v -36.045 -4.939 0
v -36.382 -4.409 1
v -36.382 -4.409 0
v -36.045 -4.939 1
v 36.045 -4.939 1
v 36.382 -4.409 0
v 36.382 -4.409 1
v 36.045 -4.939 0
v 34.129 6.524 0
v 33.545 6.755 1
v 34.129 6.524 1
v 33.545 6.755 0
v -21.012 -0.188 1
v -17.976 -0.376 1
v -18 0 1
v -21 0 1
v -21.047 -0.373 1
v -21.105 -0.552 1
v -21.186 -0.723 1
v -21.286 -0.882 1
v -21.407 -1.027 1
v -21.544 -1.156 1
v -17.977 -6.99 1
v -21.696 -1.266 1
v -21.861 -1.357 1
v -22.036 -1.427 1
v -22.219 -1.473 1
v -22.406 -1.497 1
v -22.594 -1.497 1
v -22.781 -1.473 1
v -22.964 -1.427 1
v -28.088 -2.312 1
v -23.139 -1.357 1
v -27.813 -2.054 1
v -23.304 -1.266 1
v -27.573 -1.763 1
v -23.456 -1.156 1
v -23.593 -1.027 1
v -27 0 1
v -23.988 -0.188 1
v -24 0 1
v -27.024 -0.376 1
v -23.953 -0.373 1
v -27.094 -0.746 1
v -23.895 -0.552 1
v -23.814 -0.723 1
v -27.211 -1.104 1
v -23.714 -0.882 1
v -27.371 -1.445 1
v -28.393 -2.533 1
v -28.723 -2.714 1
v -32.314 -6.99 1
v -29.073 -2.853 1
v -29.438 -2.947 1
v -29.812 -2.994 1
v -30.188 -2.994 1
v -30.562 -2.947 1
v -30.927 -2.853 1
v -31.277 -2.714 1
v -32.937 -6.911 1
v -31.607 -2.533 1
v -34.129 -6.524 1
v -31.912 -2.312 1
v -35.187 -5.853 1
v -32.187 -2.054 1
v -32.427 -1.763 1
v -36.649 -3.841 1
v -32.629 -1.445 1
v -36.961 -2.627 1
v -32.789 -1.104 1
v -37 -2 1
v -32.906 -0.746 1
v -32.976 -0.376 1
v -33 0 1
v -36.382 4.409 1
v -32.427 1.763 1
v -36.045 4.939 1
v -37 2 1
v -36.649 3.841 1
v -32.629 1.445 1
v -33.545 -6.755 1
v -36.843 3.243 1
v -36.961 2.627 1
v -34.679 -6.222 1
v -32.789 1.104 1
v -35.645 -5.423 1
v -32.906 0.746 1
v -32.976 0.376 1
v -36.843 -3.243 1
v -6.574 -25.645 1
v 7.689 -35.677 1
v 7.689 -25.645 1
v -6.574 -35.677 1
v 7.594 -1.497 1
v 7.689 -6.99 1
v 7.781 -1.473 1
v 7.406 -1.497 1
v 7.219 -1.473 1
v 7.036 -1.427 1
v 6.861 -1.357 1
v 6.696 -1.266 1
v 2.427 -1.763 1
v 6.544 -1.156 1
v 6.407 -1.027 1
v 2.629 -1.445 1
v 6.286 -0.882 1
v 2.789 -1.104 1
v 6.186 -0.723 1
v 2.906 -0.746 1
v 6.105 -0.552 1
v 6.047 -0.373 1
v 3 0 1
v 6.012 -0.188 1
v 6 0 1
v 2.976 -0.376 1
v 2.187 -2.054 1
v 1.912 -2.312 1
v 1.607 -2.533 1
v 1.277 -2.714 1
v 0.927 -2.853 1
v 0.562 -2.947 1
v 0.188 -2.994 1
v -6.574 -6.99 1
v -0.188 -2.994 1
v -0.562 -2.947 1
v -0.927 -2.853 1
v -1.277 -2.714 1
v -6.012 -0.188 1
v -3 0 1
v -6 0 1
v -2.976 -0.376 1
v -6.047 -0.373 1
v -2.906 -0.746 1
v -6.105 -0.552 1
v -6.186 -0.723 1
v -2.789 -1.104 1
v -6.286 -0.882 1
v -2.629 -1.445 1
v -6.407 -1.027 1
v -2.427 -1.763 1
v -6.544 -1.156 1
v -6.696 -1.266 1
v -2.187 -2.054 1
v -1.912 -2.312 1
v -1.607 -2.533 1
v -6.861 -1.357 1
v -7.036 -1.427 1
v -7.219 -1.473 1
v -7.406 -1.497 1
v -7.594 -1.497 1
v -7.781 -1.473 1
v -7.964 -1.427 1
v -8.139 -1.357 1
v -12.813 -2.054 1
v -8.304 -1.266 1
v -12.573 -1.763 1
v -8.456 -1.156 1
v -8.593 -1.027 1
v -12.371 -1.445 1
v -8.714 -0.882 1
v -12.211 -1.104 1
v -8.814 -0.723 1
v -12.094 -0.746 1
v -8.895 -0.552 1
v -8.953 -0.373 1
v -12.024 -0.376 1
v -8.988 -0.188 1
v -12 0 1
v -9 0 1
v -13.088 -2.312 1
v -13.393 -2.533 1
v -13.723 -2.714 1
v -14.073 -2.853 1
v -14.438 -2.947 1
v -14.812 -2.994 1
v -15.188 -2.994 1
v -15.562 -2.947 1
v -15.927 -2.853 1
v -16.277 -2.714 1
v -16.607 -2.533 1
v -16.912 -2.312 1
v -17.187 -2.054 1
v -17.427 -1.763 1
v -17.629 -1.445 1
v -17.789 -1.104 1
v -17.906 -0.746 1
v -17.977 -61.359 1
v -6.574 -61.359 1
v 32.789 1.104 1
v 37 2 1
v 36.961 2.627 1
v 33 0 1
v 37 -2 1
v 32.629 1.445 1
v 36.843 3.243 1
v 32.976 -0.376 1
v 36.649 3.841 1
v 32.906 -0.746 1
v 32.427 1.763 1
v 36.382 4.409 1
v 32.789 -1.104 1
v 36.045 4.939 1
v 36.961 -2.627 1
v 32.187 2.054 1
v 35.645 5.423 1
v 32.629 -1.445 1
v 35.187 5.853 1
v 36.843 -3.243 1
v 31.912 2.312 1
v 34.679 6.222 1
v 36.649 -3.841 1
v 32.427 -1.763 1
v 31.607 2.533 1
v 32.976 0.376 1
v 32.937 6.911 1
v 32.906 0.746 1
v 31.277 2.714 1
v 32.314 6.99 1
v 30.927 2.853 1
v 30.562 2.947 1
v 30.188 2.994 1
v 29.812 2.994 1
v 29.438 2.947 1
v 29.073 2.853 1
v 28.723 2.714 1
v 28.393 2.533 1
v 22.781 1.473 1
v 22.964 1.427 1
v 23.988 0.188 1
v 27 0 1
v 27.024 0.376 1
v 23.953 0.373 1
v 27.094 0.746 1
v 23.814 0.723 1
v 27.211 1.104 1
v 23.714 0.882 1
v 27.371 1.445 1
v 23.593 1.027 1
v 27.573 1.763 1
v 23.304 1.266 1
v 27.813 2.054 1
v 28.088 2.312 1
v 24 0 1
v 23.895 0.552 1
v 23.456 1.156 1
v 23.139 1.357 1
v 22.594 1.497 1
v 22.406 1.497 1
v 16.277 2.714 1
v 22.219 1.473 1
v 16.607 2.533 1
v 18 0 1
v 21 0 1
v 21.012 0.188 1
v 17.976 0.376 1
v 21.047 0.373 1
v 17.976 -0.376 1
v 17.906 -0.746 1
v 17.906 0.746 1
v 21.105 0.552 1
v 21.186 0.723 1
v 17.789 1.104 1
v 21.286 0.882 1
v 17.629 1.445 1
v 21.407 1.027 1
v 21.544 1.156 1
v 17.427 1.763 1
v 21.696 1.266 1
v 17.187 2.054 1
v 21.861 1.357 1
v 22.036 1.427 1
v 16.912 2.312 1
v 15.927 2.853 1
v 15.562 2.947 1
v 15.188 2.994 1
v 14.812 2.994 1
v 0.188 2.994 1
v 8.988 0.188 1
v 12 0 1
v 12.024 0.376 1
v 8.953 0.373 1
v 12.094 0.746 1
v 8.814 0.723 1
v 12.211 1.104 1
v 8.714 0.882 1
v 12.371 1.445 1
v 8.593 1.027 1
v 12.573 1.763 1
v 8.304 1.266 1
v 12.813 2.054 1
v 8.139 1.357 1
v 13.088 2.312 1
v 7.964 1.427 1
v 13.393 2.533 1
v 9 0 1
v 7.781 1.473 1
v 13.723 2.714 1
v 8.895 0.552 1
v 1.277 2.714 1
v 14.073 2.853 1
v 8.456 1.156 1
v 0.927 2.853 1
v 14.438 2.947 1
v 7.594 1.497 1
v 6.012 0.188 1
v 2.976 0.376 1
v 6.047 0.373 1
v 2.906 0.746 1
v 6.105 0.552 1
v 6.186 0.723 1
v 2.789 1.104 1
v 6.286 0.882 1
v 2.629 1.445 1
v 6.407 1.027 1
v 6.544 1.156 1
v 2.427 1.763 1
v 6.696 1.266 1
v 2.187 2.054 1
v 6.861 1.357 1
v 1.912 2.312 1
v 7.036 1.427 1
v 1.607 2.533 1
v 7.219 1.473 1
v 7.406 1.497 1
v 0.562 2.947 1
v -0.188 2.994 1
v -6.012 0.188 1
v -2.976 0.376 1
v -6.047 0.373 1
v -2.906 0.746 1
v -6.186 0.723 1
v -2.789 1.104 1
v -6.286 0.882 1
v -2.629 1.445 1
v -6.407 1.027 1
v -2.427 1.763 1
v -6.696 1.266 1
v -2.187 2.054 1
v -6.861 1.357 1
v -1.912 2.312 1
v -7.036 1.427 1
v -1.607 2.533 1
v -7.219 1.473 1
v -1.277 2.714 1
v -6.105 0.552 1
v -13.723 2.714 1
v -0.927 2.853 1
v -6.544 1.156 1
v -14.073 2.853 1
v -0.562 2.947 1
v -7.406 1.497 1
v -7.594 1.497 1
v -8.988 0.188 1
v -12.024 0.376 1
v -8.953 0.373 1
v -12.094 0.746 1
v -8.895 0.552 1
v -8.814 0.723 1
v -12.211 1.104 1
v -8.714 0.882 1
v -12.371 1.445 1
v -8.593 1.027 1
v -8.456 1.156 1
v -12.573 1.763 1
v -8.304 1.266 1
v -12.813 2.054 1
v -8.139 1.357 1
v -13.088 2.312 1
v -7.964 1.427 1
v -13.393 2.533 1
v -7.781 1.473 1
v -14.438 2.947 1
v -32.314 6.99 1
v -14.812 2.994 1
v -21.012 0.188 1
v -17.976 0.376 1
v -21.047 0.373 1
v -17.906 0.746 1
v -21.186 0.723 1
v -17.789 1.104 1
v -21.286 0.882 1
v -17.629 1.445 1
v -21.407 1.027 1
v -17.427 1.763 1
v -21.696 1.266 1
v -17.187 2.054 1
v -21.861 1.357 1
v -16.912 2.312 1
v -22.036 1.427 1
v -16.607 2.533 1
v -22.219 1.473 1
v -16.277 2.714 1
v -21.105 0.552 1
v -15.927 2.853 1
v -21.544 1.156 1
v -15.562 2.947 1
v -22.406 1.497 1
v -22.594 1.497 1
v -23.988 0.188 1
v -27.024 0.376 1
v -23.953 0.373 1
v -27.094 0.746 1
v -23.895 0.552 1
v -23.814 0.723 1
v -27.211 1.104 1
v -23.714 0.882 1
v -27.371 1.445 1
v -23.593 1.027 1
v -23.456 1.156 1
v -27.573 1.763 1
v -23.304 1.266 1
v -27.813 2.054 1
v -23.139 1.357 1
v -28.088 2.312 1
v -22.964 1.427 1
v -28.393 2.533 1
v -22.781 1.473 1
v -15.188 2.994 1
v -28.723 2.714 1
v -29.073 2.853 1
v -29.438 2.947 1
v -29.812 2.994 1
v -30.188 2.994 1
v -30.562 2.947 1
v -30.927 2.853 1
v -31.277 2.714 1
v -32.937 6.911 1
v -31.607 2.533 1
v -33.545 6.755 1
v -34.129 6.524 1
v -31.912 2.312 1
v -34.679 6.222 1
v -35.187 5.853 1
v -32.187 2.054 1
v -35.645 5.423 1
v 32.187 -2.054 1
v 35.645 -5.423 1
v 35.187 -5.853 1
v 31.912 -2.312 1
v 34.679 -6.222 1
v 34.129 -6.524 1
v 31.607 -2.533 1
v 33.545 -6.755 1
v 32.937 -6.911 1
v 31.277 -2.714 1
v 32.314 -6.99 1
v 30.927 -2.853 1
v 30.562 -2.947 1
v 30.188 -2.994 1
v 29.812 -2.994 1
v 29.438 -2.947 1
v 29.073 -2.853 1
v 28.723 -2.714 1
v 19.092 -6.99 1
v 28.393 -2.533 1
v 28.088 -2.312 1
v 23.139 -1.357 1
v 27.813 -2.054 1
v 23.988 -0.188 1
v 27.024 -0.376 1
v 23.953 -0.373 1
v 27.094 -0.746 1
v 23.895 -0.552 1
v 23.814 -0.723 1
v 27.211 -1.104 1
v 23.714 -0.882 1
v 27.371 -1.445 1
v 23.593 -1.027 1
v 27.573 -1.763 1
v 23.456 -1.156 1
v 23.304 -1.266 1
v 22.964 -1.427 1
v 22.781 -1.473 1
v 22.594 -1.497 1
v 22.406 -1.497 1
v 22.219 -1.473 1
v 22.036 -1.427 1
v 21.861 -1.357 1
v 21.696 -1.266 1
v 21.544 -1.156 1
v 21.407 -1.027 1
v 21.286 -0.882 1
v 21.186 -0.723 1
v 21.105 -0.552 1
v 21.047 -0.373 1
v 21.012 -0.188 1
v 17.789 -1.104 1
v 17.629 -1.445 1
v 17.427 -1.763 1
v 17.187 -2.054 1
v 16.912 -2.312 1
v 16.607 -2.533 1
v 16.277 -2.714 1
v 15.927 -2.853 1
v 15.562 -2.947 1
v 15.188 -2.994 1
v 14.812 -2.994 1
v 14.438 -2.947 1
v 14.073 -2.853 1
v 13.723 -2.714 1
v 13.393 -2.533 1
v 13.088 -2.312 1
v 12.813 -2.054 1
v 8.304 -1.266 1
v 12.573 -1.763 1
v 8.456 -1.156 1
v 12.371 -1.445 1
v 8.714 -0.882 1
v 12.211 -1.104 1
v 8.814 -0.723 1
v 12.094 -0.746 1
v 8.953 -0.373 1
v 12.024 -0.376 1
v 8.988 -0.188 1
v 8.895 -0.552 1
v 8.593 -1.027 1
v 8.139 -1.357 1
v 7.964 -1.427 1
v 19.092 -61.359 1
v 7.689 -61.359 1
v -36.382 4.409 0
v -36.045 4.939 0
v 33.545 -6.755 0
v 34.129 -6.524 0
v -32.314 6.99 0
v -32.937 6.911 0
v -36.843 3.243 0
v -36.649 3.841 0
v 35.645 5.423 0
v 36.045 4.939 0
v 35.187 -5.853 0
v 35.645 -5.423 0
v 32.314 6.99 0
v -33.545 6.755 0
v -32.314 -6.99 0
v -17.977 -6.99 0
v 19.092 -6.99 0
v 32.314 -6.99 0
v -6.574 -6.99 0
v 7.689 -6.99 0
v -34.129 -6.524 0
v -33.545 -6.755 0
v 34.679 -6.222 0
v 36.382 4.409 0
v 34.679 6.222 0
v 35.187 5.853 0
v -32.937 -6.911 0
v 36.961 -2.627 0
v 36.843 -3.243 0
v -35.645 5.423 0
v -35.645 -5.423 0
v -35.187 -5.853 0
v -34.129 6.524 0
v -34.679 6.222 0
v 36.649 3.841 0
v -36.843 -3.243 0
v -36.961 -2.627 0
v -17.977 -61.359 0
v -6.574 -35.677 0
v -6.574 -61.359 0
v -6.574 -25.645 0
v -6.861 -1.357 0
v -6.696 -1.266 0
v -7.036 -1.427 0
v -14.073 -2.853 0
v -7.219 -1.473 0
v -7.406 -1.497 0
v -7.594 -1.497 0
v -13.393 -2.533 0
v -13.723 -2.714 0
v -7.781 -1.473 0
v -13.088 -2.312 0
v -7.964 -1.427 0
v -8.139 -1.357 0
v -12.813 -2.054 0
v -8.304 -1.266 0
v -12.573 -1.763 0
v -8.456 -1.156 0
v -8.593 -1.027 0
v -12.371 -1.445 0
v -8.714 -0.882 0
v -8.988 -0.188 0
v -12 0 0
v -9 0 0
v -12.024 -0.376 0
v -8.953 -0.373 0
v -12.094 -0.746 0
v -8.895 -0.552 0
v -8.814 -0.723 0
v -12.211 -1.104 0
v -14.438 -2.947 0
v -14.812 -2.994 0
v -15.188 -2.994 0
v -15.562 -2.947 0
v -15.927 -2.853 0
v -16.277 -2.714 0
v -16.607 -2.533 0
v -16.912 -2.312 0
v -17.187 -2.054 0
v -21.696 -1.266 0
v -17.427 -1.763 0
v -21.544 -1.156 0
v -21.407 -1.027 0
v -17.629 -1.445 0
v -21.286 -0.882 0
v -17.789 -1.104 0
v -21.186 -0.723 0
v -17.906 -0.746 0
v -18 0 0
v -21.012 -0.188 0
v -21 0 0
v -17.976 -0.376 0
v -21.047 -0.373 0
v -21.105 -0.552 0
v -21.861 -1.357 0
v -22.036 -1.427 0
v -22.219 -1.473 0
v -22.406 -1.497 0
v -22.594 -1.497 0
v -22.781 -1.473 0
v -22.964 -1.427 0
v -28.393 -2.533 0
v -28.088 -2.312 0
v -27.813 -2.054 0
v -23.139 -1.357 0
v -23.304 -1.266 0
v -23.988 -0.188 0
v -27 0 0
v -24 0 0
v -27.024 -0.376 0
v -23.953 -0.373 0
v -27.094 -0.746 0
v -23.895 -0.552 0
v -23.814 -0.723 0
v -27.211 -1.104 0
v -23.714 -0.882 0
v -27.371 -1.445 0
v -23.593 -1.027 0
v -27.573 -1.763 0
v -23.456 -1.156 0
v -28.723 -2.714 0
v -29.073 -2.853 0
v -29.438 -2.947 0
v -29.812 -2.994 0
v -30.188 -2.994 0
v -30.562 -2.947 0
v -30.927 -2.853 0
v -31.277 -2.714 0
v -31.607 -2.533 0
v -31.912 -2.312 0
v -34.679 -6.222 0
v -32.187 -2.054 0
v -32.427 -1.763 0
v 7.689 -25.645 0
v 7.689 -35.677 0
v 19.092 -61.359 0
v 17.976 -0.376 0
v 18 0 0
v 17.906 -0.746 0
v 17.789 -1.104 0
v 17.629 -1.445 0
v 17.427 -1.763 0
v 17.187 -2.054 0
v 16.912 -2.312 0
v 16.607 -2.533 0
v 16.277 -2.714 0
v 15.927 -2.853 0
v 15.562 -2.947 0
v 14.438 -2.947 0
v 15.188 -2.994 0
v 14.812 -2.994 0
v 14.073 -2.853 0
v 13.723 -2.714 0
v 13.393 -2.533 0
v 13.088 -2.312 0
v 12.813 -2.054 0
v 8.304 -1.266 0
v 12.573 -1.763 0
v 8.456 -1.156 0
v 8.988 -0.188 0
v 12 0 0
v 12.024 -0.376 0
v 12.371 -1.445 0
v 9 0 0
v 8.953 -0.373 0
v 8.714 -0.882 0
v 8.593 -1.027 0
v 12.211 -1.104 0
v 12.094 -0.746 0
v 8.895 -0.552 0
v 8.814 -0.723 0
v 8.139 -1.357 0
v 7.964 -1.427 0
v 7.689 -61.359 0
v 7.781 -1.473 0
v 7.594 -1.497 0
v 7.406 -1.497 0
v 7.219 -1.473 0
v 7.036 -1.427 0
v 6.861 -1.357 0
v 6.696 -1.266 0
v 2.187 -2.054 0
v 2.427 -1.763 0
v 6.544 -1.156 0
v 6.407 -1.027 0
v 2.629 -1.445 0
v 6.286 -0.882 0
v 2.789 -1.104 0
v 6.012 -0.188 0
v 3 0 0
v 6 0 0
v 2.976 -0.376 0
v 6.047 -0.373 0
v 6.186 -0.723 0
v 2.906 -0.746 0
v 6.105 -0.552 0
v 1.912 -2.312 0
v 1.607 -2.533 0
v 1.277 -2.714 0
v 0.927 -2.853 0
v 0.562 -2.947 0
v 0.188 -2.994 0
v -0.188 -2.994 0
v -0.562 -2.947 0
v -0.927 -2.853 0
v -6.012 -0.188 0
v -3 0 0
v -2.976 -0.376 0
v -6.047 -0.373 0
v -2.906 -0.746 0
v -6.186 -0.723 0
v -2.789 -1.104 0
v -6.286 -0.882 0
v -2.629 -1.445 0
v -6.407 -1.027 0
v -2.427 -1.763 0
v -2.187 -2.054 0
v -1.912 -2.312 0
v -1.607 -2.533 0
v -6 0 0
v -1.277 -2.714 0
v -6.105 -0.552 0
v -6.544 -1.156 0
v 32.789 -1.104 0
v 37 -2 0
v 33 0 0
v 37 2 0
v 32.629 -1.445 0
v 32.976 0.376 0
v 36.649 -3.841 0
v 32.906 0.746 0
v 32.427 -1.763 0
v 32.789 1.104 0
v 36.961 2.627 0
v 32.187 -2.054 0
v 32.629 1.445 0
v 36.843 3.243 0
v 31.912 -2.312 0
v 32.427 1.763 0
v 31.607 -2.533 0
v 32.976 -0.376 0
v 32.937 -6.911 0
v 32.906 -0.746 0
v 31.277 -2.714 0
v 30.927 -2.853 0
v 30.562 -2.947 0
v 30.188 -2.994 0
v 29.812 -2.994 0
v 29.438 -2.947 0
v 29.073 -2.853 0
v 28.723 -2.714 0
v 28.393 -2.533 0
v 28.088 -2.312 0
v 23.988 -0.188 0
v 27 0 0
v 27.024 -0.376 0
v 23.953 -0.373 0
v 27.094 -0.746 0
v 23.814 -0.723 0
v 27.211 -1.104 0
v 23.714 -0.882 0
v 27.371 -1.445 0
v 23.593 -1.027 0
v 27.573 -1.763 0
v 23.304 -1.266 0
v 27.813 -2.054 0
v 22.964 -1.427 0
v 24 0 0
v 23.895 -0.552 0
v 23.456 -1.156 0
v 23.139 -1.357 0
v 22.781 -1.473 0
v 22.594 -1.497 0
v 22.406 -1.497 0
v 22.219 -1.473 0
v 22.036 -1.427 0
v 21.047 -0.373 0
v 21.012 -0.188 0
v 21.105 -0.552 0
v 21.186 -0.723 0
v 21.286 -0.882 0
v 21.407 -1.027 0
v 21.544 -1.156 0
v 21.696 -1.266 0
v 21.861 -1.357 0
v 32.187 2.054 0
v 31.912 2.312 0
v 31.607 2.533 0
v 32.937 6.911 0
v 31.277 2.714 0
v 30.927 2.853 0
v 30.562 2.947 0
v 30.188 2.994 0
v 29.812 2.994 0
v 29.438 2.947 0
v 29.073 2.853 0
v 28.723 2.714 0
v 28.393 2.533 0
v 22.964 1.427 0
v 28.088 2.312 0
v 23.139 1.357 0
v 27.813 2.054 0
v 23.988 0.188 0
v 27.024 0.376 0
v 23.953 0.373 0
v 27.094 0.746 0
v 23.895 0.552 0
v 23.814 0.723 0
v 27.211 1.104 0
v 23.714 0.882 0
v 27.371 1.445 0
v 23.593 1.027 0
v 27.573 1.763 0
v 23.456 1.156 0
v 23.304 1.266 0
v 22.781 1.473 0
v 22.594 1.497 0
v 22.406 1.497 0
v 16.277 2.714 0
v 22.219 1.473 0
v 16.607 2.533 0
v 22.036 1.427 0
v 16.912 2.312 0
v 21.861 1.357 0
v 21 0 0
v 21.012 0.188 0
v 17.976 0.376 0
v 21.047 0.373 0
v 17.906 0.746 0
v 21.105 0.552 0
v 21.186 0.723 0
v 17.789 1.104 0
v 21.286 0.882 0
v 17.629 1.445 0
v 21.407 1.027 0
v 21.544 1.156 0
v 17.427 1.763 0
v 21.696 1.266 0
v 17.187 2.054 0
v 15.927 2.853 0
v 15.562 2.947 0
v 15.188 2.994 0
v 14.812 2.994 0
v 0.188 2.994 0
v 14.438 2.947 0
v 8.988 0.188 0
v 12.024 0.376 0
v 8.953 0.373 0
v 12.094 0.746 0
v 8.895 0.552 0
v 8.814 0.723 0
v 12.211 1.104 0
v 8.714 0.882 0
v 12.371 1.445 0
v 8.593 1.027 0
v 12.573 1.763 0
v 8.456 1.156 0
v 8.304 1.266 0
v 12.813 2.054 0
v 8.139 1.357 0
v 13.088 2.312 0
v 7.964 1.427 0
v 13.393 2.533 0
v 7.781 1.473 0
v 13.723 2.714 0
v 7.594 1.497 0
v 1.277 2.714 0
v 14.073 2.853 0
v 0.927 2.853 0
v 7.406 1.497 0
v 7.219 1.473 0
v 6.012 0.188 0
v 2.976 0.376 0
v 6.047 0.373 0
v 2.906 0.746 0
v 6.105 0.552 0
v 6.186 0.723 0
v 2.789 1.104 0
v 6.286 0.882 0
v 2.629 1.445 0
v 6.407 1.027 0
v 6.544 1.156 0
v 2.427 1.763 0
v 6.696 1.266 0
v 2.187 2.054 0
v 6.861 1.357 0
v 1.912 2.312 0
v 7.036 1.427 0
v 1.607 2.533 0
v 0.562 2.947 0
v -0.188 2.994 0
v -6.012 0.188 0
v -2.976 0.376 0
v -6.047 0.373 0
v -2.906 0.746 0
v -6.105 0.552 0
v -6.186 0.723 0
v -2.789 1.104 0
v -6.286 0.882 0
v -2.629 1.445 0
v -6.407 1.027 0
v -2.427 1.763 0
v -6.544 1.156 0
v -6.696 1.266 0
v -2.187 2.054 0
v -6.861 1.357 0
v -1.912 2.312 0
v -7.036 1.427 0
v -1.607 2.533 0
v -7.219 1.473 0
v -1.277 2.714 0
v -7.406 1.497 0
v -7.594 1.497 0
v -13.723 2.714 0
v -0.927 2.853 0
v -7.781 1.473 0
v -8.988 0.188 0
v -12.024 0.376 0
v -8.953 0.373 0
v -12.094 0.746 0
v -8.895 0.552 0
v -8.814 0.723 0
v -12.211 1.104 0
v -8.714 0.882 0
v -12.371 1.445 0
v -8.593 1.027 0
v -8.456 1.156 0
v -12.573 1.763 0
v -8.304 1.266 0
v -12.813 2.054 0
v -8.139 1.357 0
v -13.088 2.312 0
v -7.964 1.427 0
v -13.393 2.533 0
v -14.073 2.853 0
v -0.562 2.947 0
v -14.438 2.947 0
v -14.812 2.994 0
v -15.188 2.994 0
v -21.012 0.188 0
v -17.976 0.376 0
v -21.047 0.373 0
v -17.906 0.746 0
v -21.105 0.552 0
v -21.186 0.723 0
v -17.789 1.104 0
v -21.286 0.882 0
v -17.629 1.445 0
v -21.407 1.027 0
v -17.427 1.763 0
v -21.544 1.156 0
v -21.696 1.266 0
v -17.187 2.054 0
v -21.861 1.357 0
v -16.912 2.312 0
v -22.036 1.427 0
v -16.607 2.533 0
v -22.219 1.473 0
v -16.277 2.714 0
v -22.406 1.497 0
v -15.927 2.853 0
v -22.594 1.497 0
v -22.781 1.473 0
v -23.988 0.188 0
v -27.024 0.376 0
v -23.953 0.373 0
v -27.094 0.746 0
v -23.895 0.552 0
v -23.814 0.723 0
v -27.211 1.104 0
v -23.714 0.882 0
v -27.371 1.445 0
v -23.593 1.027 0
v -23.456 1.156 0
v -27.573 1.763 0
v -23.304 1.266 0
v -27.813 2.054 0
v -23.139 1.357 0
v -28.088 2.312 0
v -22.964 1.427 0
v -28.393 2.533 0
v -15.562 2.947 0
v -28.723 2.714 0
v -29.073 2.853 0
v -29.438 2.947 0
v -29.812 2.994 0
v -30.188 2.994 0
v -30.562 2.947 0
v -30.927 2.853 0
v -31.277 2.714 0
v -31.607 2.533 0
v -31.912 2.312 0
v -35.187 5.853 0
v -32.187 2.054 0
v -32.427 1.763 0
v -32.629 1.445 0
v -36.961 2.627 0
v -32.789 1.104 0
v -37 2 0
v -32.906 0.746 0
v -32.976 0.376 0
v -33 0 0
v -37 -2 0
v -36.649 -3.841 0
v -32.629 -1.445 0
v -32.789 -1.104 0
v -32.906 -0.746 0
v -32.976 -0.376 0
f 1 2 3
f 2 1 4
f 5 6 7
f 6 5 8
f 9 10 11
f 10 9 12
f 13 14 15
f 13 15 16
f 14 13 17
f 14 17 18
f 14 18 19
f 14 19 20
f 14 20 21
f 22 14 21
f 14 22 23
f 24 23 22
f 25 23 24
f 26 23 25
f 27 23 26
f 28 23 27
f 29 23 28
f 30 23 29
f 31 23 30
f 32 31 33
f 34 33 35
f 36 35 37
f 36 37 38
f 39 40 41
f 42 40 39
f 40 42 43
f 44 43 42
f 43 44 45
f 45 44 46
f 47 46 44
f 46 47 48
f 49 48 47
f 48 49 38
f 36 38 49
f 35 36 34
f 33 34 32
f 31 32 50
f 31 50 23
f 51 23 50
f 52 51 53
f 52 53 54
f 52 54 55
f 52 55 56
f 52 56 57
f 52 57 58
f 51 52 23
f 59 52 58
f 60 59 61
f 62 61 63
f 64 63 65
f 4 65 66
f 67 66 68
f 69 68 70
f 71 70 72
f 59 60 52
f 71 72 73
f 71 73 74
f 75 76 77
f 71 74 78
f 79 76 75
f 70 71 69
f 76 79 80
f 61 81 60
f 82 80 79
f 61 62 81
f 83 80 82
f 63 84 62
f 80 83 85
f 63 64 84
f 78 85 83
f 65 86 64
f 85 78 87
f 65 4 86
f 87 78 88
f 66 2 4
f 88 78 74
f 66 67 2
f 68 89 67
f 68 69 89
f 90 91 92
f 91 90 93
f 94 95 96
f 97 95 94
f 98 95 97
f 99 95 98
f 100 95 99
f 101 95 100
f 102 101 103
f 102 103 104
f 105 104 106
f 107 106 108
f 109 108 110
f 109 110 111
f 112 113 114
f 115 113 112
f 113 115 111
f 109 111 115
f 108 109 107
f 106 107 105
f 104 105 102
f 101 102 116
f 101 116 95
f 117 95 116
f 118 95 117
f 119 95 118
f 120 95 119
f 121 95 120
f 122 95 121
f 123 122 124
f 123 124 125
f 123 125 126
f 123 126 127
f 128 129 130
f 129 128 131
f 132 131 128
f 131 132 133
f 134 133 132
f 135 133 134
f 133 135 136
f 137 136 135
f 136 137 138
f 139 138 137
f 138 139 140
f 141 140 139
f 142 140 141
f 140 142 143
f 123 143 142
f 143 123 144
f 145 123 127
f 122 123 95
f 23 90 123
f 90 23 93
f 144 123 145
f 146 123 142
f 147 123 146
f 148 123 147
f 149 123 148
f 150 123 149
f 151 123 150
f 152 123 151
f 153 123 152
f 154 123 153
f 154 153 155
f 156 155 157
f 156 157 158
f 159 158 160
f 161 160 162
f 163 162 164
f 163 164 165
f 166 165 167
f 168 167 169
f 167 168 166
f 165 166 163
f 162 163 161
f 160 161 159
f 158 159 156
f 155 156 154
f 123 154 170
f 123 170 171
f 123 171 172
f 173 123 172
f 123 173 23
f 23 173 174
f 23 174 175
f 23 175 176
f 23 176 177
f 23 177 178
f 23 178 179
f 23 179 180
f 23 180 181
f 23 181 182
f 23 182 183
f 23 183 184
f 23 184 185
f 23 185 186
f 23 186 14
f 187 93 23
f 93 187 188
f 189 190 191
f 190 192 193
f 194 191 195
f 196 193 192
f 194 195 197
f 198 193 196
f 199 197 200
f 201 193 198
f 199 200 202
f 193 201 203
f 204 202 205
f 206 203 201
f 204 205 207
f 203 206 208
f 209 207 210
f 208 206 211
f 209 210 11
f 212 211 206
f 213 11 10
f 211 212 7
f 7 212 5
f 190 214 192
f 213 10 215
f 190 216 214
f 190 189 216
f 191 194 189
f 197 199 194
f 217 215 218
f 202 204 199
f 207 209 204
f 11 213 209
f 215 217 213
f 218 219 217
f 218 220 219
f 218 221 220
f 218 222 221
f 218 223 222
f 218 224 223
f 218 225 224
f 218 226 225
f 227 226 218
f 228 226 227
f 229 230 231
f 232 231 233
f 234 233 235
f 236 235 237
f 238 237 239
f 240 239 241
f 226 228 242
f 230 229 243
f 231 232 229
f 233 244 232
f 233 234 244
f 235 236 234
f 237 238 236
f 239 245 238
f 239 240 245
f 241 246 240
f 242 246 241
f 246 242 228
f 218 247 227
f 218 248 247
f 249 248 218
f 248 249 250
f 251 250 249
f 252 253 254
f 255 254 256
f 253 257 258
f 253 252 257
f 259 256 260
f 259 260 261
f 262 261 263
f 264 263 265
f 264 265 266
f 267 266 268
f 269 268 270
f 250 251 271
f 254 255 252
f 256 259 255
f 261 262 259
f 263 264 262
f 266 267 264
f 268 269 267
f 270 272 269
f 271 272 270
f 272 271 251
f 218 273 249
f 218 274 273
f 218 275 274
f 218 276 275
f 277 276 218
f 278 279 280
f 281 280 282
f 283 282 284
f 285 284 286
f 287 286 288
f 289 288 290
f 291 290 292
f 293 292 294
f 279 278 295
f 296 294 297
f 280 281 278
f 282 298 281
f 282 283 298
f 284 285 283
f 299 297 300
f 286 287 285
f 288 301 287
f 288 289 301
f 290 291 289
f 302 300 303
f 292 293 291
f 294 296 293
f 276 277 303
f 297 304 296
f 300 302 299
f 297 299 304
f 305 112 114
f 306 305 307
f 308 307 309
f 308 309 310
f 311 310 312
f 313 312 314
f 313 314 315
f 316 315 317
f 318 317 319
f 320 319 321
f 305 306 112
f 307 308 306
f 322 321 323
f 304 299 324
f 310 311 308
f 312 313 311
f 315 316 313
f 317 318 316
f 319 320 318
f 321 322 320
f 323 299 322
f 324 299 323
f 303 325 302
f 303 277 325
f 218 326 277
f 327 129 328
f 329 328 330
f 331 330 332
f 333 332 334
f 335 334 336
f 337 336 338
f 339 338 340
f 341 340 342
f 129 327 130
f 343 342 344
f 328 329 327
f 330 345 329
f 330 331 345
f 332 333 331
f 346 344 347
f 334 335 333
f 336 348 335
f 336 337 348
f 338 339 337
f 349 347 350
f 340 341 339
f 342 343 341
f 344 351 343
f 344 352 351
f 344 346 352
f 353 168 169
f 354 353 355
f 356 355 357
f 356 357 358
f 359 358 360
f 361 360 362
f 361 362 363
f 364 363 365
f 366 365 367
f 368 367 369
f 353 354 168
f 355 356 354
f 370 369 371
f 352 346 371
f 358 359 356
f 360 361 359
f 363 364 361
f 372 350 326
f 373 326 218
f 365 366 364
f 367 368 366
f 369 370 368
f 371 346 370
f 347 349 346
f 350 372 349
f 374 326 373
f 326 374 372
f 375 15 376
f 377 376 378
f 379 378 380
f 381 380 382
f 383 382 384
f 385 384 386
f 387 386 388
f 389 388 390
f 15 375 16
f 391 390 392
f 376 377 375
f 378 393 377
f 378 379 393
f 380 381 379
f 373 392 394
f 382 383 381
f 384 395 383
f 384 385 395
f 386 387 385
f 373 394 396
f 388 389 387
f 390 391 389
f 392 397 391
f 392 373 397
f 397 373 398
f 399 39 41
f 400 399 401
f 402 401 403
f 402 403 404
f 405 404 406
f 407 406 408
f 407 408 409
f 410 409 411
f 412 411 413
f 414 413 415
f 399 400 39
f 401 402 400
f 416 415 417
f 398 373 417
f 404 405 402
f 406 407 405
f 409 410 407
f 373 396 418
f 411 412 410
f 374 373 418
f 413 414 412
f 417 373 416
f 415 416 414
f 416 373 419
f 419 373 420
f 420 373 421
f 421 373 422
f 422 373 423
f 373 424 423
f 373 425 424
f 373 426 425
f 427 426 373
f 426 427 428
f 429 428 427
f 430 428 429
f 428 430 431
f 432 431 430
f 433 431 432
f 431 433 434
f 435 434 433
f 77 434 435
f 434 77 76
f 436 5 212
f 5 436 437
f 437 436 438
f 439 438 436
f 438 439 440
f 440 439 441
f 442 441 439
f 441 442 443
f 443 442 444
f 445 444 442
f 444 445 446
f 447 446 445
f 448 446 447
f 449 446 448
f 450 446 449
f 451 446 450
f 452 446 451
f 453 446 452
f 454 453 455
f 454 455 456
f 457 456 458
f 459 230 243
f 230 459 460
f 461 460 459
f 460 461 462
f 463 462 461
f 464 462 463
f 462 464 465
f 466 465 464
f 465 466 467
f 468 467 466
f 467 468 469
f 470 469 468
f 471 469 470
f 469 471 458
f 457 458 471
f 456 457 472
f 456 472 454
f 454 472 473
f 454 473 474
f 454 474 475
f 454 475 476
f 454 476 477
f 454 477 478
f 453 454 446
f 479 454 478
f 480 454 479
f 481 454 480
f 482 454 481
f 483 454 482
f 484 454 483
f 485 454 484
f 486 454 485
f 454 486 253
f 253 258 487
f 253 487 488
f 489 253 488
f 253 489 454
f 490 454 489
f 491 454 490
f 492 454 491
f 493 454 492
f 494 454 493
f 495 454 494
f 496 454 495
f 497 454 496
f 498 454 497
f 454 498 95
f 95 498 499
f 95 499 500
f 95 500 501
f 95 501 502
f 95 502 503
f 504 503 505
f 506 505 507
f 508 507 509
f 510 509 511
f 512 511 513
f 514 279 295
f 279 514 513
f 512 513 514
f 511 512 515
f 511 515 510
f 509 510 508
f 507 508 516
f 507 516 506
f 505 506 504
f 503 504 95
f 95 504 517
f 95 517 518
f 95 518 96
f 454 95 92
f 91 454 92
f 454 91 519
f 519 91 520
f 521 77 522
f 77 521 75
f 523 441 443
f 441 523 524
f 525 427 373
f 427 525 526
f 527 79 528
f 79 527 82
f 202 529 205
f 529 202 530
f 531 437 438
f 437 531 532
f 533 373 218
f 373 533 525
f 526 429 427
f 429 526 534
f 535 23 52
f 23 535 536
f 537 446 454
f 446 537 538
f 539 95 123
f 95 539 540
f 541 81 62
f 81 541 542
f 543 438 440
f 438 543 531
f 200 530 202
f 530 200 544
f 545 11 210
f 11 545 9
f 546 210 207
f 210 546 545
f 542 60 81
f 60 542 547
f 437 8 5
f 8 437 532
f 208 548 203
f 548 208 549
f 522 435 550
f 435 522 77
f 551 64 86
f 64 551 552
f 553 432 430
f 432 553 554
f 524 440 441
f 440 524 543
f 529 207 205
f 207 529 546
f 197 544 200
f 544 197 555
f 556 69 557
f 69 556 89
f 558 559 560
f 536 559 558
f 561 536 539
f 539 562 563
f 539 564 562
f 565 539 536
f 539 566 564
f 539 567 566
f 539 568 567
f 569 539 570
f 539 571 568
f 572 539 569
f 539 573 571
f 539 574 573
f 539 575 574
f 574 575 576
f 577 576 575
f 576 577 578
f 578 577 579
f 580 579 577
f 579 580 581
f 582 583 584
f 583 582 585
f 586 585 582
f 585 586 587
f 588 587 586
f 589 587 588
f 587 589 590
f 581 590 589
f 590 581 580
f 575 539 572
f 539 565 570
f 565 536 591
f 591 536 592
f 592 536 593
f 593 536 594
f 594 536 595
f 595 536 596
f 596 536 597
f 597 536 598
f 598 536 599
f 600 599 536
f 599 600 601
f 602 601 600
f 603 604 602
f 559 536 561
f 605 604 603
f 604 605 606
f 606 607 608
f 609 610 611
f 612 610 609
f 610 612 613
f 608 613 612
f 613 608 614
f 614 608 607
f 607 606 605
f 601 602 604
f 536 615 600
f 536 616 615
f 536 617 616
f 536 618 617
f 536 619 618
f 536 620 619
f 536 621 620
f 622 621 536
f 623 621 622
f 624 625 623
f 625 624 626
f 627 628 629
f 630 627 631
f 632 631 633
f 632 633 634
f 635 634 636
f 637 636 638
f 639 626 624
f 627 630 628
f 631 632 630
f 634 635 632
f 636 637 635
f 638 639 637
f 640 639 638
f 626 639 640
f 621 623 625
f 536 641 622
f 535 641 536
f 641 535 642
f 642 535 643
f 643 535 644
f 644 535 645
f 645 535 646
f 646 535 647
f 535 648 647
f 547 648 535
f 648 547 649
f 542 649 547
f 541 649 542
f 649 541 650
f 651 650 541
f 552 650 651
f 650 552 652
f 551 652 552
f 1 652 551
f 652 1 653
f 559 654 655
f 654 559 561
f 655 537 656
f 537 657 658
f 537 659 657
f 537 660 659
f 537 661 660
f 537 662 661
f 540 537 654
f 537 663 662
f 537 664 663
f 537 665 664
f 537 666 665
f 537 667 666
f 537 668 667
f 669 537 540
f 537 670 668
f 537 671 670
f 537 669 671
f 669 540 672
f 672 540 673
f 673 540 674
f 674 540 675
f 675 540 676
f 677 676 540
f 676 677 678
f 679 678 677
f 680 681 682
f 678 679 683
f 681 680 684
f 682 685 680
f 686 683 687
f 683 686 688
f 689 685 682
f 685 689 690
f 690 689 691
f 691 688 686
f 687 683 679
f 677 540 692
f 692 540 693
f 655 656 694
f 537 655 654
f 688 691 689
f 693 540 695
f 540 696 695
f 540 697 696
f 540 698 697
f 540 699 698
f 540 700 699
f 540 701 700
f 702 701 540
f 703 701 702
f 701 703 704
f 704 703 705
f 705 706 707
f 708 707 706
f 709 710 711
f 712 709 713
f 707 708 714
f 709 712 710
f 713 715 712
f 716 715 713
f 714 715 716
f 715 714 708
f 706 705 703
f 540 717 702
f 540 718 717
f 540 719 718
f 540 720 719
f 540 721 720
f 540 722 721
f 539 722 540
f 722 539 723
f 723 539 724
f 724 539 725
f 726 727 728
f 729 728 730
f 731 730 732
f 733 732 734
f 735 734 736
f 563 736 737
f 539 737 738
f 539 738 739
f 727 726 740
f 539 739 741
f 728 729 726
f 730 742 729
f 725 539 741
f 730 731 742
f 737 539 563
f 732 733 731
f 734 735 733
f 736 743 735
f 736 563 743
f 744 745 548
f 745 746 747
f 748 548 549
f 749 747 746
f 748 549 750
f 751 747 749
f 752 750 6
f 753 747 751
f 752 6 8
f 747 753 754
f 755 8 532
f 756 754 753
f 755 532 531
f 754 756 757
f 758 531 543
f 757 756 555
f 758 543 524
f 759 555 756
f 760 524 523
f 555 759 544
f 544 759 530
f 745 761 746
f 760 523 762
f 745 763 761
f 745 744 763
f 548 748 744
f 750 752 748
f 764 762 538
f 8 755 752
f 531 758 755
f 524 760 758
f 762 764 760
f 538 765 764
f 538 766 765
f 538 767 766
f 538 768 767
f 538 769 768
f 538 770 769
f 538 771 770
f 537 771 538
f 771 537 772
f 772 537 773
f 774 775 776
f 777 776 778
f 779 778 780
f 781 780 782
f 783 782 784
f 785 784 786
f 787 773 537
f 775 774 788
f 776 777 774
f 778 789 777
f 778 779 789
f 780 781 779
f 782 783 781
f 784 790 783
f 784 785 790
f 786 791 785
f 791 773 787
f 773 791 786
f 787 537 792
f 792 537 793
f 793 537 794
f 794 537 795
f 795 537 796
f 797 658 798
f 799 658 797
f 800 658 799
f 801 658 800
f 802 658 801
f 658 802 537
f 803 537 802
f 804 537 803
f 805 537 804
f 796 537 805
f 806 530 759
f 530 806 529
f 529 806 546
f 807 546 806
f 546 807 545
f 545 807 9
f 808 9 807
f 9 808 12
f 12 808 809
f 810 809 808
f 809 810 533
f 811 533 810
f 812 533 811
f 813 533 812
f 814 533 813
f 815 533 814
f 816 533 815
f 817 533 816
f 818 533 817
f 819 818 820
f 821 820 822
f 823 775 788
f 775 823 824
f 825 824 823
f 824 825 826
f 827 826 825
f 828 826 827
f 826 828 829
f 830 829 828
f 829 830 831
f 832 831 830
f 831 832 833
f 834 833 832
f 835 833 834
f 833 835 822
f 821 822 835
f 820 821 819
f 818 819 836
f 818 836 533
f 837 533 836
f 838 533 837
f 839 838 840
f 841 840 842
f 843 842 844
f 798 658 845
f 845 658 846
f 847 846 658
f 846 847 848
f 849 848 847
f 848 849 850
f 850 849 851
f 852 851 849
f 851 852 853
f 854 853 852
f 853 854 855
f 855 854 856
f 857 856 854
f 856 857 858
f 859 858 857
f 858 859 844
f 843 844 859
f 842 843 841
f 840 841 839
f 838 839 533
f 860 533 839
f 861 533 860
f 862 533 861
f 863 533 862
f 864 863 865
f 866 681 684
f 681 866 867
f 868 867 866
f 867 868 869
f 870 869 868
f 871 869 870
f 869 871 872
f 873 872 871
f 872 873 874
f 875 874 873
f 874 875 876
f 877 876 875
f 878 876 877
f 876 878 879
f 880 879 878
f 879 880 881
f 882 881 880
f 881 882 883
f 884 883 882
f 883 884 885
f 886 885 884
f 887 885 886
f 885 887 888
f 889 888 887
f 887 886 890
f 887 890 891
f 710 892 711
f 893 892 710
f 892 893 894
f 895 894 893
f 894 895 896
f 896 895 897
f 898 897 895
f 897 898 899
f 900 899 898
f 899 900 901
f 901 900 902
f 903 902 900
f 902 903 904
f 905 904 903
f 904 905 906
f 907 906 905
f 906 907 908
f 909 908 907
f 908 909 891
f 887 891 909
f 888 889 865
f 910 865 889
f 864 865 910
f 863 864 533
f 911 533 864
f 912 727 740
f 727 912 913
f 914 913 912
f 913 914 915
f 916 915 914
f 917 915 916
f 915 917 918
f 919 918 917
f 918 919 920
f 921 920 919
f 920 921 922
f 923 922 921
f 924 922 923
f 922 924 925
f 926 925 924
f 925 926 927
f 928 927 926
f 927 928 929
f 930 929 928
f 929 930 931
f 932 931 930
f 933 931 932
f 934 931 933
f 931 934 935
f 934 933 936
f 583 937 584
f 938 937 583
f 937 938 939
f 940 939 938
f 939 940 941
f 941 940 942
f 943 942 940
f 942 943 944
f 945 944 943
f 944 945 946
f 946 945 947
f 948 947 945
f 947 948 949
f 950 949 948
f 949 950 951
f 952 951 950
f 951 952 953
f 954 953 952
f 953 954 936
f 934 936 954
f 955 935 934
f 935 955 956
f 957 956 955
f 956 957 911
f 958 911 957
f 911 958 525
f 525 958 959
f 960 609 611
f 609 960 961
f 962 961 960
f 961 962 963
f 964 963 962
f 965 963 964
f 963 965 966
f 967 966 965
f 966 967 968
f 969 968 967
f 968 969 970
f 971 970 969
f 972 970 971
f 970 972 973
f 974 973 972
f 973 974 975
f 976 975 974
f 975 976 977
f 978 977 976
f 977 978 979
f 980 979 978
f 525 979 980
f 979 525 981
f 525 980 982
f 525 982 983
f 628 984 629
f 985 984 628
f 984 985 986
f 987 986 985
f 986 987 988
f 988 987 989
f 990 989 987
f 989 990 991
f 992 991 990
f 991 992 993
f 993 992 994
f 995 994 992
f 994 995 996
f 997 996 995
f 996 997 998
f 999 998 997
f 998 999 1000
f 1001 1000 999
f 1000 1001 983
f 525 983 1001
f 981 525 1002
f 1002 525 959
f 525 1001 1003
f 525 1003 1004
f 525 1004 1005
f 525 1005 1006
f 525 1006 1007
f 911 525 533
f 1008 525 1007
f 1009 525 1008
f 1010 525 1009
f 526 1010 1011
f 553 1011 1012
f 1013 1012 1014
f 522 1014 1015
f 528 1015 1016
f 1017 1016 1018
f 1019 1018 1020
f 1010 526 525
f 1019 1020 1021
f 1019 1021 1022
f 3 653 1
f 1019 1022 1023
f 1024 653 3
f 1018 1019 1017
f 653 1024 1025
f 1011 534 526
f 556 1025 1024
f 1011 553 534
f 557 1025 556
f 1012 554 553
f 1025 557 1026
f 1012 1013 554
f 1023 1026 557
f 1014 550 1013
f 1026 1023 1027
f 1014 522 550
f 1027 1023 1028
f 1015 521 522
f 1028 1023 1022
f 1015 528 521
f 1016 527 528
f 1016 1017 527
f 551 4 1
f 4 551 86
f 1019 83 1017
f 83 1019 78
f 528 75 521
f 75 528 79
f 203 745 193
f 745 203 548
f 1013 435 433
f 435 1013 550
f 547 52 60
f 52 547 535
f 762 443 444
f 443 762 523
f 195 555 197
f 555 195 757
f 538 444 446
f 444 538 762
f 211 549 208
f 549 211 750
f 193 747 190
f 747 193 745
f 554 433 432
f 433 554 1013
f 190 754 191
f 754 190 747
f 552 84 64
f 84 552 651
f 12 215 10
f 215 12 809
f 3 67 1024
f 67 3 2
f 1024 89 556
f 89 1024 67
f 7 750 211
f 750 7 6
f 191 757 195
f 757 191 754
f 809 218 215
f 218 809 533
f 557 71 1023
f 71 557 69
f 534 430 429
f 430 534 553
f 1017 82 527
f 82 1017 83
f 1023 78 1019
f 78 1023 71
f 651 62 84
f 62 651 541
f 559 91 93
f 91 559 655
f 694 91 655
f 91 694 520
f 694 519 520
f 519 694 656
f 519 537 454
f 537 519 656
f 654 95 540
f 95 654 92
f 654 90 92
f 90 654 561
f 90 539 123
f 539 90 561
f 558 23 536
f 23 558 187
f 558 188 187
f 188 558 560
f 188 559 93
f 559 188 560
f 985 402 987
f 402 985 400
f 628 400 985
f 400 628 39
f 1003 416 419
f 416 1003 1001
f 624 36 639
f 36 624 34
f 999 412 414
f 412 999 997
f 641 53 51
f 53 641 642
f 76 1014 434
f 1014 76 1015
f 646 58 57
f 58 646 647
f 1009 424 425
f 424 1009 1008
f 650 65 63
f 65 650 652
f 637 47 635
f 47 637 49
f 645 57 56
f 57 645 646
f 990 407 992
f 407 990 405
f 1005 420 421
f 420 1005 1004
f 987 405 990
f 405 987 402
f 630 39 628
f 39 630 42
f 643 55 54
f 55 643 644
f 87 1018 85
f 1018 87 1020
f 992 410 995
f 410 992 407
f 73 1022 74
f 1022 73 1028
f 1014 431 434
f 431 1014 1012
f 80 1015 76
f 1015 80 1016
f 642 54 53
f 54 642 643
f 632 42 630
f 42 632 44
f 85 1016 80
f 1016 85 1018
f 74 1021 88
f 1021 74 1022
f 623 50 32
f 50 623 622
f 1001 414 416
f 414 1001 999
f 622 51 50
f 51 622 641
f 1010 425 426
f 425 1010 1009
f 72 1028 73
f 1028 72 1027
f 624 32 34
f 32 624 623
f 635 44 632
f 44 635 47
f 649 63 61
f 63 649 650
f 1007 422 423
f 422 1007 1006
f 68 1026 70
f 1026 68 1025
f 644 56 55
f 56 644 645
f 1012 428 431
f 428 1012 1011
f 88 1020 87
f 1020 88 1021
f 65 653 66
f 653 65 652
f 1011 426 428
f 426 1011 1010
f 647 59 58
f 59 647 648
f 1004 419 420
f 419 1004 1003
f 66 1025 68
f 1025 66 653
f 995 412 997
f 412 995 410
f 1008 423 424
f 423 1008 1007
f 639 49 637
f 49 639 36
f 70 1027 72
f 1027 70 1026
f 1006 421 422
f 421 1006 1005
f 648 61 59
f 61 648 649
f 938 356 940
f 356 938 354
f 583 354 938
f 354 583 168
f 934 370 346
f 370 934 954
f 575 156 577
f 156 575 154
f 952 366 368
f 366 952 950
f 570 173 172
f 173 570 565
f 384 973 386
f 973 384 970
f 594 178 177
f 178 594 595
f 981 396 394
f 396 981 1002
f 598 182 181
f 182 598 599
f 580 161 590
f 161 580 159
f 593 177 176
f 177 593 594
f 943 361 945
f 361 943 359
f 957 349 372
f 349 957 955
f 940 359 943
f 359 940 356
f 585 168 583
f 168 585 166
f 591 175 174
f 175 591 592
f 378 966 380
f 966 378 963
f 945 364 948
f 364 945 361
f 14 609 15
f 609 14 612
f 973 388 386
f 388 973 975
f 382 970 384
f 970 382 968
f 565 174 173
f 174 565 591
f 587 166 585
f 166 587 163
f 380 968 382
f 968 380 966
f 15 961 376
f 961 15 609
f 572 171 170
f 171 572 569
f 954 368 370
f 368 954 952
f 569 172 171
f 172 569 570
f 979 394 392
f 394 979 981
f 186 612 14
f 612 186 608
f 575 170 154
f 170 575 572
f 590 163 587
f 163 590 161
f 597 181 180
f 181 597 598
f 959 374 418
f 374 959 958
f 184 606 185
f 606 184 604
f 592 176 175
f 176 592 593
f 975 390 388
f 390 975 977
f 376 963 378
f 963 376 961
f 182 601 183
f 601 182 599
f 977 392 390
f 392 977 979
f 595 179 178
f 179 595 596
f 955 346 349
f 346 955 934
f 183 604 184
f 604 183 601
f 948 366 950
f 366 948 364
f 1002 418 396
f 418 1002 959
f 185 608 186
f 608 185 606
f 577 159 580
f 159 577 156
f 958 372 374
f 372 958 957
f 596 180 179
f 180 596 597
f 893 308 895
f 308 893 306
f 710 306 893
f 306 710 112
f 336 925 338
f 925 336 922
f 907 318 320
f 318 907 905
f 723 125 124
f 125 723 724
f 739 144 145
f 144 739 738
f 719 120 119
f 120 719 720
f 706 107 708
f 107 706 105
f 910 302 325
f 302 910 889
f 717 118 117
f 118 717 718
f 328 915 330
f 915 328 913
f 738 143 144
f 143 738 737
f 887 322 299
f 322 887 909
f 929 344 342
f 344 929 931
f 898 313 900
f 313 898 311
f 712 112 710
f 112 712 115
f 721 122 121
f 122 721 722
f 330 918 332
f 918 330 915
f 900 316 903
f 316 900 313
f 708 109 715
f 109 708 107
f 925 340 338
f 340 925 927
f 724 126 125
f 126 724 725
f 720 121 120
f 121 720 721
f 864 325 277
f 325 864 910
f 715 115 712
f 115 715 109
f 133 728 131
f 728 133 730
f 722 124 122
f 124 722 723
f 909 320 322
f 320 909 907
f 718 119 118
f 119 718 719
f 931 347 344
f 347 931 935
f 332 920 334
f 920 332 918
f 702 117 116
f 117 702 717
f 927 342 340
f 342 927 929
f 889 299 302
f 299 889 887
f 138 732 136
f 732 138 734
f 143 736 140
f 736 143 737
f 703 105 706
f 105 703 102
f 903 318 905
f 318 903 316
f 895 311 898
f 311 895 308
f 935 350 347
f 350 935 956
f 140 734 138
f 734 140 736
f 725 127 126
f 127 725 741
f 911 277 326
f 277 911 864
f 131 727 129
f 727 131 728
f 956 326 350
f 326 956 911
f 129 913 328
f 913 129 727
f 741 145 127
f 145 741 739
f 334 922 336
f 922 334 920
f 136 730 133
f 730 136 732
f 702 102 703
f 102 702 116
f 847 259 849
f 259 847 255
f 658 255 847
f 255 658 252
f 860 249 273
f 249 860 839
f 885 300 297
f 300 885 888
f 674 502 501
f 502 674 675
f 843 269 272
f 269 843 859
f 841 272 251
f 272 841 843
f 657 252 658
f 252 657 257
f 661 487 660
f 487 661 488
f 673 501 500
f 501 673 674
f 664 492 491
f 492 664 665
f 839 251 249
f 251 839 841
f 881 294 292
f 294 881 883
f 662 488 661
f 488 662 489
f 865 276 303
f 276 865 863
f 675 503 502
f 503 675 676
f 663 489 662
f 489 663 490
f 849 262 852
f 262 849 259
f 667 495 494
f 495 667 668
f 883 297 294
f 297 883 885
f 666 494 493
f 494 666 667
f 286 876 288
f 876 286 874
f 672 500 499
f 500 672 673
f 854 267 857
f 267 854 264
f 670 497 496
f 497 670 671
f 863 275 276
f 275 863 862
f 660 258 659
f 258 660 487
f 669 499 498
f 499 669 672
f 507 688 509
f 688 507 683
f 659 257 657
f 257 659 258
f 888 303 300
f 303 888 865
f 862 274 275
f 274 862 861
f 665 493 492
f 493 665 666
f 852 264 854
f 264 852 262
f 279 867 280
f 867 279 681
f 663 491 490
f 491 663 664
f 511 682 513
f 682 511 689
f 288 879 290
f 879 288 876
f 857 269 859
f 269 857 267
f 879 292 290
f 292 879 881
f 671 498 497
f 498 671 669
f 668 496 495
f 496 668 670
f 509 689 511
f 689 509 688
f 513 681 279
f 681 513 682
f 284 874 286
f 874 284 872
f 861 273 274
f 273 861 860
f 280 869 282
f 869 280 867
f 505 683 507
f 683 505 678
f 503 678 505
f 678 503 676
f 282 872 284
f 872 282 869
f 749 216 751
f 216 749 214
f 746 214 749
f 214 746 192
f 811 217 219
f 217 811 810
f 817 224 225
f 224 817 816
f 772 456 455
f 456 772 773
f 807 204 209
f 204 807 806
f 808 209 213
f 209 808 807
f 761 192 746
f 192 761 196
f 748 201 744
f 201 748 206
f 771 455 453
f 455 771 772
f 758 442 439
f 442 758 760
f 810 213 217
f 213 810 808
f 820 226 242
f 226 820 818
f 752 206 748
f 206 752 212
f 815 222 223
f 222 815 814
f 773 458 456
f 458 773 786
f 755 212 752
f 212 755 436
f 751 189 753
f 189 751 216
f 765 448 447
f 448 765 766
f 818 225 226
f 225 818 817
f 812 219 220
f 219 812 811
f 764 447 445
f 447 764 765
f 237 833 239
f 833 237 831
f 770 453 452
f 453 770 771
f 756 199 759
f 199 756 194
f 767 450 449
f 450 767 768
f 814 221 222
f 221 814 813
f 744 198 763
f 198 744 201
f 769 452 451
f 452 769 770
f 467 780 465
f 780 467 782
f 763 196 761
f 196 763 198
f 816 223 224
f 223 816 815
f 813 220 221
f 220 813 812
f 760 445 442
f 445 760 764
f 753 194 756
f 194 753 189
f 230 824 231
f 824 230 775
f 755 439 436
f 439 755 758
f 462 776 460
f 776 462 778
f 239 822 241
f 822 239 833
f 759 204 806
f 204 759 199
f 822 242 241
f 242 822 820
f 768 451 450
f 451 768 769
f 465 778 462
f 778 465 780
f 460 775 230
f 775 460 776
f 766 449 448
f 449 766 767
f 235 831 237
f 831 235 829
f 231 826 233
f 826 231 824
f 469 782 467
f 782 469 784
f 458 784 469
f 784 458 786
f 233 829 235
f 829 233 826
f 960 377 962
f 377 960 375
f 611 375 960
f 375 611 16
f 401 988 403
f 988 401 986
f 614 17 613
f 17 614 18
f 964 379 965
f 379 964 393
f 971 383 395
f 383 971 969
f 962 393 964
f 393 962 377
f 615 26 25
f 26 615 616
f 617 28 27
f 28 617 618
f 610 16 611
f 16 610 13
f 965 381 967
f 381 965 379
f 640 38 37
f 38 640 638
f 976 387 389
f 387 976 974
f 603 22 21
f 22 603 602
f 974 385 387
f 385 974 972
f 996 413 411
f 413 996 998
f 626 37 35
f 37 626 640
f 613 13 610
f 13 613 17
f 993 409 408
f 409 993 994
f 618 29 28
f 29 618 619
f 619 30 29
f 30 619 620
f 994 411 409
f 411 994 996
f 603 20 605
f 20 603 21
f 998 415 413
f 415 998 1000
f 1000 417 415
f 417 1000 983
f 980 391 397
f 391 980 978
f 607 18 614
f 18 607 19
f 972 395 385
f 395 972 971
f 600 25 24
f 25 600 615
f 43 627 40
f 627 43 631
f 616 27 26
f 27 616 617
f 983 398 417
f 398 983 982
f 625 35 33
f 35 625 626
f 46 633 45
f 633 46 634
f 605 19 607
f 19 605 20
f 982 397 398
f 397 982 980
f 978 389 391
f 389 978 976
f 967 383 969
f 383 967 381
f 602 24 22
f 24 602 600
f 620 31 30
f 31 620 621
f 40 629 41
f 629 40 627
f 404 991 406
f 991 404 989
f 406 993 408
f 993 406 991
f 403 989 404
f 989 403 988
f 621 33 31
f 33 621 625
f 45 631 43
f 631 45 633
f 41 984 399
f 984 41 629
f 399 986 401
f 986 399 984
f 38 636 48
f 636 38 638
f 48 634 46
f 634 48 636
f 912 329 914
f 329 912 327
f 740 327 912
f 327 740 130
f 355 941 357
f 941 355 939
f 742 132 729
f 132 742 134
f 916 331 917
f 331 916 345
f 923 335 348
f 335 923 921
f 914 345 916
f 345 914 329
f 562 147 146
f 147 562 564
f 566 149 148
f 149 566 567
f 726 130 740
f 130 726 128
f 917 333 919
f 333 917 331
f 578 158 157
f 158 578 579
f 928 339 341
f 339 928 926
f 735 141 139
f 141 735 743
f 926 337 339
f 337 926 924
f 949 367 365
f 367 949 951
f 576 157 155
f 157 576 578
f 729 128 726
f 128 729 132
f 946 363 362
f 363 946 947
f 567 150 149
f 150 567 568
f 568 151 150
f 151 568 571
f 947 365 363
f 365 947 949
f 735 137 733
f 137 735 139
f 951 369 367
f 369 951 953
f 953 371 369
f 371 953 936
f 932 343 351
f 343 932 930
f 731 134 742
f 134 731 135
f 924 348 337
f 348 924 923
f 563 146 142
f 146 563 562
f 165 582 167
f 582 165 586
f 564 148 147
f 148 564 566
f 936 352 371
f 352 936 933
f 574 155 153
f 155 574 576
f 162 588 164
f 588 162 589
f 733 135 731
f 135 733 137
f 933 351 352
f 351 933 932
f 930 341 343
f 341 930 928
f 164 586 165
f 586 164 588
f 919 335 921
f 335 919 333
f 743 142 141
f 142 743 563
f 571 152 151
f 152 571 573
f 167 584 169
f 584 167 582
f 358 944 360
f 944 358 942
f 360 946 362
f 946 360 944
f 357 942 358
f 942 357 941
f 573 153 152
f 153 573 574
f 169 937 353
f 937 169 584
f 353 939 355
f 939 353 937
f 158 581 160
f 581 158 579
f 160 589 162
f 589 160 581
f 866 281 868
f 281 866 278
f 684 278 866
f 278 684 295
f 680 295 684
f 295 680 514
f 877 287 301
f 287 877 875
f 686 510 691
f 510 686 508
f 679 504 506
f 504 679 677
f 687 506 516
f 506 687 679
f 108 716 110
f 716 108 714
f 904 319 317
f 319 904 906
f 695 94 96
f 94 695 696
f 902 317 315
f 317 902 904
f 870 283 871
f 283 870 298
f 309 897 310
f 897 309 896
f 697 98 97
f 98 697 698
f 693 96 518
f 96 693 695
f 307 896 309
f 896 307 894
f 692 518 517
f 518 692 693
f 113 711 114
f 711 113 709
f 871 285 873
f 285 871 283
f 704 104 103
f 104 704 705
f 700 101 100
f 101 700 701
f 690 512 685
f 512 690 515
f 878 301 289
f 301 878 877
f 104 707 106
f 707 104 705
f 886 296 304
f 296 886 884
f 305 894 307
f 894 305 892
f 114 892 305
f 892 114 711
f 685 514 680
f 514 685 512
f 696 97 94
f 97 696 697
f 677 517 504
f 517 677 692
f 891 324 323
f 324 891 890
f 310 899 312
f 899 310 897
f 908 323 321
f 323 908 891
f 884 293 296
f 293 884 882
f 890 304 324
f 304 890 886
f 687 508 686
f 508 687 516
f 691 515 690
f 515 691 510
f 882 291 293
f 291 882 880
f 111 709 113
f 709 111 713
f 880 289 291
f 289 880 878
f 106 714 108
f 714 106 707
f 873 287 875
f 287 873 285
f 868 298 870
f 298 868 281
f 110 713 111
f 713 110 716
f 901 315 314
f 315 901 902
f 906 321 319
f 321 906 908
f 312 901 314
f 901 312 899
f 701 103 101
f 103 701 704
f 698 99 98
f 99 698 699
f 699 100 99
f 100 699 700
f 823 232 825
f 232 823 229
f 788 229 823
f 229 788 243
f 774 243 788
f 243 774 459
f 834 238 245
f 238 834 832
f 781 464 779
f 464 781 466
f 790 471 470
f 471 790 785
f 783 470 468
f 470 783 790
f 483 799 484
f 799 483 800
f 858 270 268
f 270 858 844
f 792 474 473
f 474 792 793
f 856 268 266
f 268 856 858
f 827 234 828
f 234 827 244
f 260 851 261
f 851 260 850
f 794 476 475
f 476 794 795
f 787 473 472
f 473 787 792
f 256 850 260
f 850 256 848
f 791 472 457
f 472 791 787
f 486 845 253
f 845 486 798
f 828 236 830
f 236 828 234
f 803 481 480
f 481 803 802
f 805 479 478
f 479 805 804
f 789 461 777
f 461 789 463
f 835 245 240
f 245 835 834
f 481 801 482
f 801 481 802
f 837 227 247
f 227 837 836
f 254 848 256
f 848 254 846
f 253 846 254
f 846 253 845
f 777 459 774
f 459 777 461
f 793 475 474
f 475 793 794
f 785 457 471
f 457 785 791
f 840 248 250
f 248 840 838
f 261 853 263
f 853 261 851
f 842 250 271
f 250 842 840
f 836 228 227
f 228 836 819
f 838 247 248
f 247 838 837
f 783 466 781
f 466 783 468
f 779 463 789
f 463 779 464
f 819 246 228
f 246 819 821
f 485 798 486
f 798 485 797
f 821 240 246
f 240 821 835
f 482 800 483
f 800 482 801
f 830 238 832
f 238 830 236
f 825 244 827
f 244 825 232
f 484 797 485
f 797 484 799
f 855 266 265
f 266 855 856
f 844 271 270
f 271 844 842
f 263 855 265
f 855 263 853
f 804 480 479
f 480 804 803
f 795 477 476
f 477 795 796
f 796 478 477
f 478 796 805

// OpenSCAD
$fn = 50;


difference() {
	union() {
		*color(alpha = 1.0000000000, c = "gray") {
			translate(v = [0, 14, 0]) {
				linear_extrude(height = 1) {
					text(font = "Arial:style=Bold", halign = "center", size = 4.5000000000, text = "COMMENT description oobb_plate_shape_p_type_1_depth_5_width_1_thickness_h_extra_oobb_size", valign = "center");
				}
			}
		}
		hull() {
			translate(v = [-32.0000000000, 2.0000000000, 0]) {
				cylinder(h = 1, r = 5);
			}
			translate(v = [32.0000000000, 2.0000000000, 0]) {
				cylinder(h = 1, r = 5);
			}
			translate(v = [-32.0000000000, -2.0000000000, 0]) {
				cylinder(h = 1, r = 5);
			}
			translate(v = [32.0000000000, -2.0000000000, 0]) {
				cylinder(h = 1, r = 5);
			}
		}
		translate(v = [0, -5, 0]) {
			linear_extrude(height = 1) {
				text(font = "DejaVu Sans Mono:style=Bold", halign = "center", size = 57.0000000000, text = "H", valign = "top");
			}
		}
	}
	union() {
		*color(alpha = 1.0000000000, c = "gray") {
			translate(v = [0, 14, 0]) {
				linear_extrude(height = 1) {
					text(font = "Arial:style=Bold", halign = "center", size = 4.5000000000, text = "COMMENT description oobb_holes_shape_n_type_5_width_1_thickness_h_extra_oobb_size_1_height_'all'_holes_true_both_holes", valign = "center");
				}
			}
		}
		translate(v = [-30.0000000000, 0.0000000000, 0]) {
			translate(v = [0, 0, -50]) {
				cylinder(h = 100, r = 3.0000000000);
			}
		}
		translate(v = [-15.0000000000, 0.0000000000, 0]) {
			translate(v = [0, 0, -50]) {
				cylinder(h = 100, r = 3.0000000000);
			}
		}
		translate(v = [0, 0, -50]) {
			cylinder(h = 100, r = 3.0000000000);
		}
		translate(v = [15.0000000000, 0.0000000000, 0]) {
			translate(v = [0, 0, -50]) {
				cylinder(h = 100, r = 3.0000000000);
			}
		}
		translate(v = [30.0000000000, 0.0000000000, 0]) {
			translate(v = [0, 0, -50]) {
				cylinder(h = 100, r = 3.0000000000);
			}
		}
		translate(v = [-30.0000000000, 0.0000000000, 0]) {
			translate(v = [0, 0, -50]) {
				cylinder(h = 100, r = 1.5000000000);
			}
		}
		translate(v = [-22.5000000000, 0.0000000000, 0]) {
			translate(v = [0, 0, -50]) {
				cylinder(h = 100, r = 1.5000000000);
			}
		}
		translate(v = [-15.0000000000, 0.0000000000, 0]) {
			translate(v = [0, 0, -50]) {
				cylinder(h = 100, r = 1.5000000000);
			}
		}
		translate(v = [-7.5000000000, 0.0000000000, 0]) {
			translate(v = [0, 0, -50]) {
				cylinder(h = 100, r = 1.5000000000);
			}
		}
		translate(v = [0, 0, -50]) {
			cylinder(h = 100, r = 1.5000000000);
		}
		translate(v = [7.5000000000, 0.0000000000, 0]) {
			translate(v = [0, 0, -50]) {
				cylinder(h = 100, r = 1.5000000000);
			}
		}
		translate(v = [15.0000000000, 0.0000000000, 0]) {
			translate(v = [0, 0, -50]) {
				cylinder(h = 100, r = 1.5000000000);
			}
		}
		translate(v = [22.5000000000, 0.0000000000, 0]) {
			translate(v = [0, 0, -50]) {
				cylinder(h = 100, r = 1.5000000000);
			}
		}
		translate(v = [30.0000000000, 0.0000000000, 0]) {
			translate(v = [0, 0, -50]) {
				cylinder(h = 100, r = 1.5000000000);
			}
		}
	}
}
